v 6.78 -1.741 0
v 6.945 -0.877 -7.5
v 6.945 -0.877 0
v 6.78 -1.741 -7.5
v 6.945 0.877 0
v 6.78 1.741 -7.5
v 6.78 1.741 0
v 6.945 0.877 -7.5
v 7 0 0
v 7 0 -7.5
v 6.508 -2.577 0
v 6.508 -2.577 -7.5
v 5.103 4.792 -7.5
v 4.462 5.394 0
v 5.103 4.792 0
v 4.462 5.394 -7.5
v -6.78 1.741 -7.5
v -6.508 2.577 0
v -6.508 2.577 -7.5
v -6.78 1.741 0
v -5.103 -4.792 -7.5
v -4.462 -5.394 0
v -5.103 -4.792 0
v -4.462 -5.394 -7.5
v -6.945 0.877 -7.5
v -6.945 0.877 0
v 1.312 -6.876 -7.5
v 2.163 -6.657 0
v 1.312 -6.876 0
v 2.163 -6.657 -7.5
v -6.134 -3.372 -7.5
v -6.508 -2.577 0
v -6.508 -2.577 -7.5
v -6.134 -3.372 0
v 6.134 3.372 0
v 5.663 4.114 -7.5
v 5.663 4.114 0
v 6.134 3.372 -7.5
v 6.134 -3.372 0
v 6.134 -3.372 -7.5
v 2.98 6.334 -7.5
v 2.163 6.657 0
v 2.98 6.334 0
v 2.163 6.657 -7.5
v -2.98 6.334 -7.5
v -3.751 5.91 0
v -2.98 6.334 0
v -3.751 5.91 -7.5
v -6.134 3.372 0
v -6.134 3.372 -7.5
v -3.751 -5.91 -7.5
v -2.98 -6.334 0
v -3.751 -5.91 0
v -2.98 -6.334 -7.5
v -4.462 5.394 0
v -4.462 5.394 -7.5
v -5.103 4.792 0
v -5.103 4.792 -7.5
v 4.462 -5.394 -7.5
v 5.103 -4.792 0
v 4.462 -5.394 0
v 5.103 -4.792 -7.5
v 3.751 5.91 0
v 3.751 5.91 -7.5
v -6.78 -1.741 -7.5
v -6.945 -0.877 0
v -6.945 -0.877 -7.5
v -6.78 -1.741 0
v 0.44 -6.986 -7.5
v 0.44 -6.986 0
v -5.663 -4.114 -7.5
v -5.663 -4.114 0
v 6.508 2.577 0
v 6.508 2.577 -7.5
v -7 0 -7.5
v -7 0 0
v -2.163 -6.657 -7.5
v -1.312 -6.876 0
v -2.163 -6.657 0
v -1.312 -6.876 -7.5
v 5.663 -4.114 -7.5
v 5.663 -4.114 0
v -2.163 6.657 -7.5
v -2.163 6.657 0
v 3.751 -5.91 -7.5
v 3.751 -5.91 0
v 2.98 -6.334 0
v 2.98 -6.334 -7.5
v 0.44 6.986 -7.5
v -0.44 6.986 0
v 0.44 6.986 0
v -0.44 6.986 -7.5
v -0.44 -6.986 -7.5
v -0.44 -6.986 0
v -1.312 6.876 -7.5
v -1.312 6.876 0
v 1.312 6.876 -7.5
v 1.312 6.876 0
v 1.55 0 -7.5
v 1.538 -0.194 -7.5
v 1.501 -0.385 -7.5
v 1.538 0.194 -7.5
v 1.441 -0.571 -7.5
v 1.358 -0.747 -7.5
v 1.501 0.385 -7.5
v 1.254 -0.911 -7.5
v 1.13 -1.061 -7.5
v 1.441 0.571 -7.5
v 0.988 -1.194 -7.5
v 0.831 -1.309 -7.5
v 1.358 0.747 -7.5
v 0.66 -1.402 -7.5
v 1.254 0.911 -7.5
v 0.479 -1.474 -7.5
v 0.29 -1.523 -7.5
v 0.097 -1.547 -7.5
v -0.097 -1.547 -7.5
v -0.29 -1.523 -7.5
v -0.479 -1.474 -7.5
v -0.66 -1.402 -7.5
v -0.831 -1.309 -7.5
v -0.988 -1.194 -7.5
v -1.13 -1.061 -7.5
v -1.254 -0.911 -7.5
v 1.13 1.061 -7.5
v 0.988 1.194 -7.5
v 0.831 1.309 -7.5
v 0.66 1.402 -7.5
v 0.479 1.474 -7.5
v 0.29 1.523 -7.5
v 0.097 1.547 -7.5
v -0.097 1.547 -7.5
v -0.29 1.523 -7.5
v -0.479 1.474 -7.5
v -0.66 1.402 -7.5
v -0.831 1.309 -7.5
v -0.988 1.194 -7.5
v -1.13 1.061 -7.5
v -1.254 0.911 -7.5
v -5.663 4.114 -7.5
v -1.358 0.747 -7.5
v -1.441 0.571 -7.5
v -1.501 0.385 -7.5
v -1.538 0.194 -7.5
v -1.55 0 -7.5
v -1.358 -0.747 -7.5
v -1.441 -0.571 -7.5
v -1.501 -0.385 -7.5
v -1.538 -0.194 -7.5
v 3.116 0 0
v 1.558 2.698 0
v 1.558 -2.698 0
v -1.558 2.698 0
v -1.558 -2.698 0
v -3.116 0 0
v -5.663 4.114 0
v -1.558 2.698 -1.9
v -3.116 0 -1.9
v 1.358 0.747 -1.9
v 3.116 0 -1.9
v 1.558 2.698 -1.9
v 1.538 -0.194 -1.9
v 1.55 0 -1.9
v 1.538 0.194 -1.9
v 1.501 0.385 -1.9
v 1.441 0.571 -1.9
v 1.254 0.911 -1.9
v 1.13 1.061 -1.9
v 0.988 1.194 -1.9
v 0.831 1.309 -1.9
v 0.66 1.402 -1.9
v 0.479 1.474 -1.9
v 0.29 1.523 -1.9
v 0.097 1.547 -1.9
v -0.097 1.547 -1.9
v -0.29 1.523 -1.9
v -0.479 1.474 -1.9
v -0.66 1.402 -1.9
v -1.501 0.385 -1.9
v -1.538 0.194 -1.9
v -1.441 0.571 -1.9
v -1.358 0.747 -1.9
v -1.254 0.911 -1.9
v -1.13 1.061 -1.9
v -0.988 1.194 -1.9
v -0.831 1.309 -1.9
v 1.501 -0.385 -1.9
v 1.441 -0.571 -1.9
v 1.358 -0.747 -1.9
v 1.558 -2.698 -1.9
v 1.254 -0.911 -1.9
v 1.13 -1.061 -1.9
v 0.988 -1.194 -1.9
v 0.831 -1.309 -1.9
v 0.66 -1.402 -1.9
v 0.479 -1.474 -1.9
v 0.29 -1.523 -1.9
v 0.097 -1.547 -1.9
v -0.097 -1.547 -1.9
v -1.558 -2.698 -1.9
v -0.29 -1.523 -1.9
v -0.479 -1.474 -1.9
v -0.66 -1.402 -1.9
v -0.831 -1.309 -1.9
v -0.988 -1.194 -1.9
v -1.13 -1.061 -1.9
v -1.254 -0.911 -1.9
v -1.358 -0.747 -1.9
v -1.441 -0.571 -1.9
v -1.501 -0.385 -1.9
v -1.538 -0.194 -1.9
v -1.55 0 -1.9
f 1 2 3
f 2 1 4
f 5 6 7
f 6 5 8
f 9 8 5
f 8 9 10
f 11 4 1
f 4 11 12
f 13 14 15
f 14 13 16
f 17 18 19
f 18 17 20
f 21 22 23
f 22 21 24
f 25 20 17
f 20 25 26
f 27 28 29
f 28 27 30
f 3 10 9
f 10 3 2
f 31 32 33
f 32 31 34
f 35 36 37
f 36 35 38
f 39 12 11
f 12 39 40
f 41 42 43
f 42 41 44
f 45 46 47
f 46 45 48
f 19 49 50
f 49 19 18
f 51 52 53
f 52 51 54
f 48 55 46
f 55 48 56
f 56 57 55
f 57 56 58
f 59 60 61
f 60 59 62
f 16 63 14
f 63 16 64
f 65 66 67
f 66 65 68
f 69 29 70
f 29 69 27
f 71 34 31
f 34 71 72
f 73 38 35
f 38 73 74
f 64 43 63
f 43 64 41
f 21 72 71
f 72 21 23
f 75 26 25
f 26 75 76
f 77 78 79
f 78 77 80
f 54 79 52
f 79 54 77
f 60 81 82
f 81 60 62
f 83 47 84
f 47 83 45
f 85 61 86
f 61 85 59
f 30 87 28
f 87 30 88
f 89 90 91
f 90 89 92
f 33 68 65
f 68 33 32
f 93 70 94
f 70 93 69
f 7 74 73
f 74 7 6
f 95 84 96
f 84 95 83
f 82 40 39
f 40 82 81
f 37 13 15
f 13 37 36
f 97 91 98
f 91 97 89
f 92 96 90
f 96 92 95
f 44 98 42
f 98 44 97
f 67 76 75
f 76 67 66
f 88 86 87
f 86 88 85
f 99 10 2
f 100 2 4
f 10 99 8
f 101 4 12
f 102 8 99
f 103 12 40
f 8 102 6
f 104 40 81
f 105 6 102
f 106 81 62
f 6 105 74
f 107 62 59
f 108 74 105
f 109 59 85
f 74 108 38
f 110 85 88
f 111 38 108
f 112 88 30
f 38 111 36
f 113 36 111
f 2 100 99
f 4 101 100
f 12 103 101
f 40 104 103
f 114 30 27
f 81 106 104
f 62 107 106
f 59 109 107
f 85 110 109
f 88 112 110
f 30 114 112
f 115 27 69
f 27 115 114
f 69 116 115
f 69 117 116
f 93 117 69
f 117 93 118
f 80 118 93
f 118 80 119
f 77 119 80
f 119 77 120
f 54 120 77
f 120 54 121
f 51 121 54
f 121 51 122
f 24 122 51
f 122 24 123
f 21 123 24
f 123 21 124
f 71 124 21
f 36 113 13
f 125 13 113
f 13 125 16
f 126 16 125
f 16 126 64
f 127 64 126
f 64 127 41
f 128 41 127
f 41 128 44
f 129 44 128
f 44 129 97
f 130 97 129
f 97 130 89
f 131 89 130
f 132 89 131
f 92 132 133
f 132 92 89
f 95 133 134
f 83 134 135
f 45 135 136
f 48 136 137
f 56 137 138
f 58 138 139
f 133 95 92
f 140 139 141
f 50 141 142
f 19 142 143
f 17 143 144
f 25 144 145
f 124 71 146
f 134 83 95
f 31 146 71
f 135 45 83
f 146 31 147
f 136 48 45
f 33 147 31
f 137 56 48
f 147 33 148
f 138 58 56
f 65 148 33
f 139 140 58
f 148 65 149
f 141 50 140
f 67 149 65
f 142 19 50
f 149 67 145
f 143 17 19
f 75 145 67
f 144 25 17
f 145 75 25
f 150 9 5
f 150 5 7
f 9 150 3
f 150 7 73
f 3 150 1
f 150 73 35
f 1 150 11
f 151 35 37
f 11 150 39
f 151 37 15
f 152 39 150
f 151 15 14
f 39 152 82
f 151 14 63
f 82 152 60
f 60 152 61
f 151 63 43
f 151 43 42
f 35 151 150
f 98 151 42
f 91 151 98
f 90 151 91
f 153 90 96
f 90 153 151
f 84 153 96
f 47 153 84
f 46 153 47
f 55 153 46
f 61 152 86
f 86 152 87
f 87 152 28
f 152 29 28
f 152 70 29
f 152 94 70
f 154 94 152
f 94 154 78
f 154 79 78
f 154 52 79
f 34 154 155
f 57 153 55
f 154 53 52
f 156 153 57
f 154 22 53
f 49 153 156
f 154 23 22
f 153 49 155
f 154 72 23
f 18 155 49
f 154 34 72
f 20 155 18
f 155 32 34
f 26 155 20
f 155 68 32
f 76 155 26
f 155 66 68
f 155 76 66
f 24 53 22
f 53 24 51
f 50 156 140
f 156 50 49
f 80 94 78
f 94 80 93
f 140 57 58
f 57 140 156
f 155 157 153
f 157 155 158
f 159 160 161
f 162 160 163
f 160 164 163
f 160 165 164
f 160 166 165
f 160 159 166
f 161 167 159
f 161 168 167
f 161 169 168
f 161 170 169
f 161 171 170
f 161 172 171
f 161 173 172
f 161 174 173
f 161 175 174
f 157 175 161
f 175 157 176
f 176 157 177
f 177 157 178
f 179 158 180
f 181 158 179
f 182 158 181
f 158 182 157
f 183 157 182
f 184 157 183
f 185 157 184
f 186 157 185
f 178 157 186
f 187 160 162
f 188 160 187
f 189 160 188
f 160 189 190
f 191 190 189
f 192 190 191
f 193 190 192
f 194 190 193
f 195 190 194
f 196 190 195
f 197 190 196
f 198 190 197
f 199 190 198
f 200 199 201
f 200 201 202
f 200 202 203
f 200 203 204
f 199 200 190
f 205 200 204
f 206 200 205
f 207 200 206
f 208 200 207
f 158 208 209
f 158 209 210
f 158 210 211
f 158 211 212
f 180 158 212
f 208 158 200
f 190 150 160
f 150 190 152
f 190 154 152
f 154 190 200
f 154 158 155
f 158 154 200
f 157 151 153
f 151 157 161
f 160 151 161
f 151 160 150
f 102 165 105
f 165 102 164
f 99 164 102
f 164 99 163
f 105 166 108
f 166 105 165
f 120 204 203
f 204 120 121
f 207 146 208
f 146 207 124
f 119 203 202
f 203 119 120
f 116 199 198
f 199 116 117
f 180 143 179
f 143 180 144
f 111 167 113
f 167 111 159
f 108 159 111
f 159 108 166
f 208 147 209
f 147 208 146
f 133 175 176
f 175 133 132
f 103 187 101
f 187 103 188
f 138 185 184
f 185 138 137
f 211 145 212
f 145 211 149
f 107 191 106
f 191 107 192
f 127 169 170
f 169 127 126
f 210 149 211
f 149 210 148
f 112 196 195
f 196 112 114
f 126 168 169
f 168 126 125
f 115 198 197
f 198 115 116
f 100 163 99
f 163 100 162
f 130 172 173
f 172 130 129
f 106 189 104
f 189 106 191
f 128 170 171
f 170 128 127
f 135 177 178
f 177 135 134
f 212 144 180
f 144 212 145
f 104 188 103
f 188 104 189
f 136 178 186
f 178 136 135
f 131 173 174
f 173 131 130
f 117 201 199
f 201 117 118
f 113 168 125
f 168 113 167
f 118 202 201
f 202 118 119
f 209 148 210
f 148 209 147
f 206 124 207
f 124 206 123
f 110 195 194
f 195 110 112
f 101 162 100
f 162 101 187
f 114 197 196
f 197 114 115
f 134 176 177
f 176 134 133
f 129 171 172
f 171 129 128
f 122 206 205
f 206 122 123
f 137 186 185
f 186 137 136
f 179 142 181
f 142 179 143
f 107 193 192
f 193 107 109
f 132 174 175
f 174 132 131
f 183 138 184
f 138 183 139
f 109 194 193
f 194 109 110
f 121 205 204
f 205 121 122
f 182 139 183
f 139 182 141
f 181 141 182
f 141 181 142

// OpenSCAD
$fn = 50;


difference() {
	union() {
		translate(v = [0, 0, -7.5000000000]) {
			cylinder(h = 7.5000000000, r = 7.0000000000);
		}
		translate(v = [0, 0, -6.0000000000]) {
			cylinder(h = 6, r = 2.8750000000);
		}
	}
	union() {
		translate(v = [0, 0, 0]) {
			rotate(a = [0, 0, 0]) {
				difference() {
					union() {
						translate(v = [0, 0, -1.9000000000]) {
							linear_extrude(height = 1.9000000000) {
								polygon(points = [[3.1158000000, 0.0000000000], [1.5579000000, 2.6983619531], [-1.5579000000, 2.6983619531], [-3.1158000000, 0.0000000000], [-1.5579000000, -2.6983619531], [1.5579000000, -2.6983619531]]);
							}
						}
					}
					union();
				}
			}
		}
		#translate(v = [0, 0, -100.0000000000]) {
			cylinder(h = 200, r = 1.5500000000);
		}
	}
}
